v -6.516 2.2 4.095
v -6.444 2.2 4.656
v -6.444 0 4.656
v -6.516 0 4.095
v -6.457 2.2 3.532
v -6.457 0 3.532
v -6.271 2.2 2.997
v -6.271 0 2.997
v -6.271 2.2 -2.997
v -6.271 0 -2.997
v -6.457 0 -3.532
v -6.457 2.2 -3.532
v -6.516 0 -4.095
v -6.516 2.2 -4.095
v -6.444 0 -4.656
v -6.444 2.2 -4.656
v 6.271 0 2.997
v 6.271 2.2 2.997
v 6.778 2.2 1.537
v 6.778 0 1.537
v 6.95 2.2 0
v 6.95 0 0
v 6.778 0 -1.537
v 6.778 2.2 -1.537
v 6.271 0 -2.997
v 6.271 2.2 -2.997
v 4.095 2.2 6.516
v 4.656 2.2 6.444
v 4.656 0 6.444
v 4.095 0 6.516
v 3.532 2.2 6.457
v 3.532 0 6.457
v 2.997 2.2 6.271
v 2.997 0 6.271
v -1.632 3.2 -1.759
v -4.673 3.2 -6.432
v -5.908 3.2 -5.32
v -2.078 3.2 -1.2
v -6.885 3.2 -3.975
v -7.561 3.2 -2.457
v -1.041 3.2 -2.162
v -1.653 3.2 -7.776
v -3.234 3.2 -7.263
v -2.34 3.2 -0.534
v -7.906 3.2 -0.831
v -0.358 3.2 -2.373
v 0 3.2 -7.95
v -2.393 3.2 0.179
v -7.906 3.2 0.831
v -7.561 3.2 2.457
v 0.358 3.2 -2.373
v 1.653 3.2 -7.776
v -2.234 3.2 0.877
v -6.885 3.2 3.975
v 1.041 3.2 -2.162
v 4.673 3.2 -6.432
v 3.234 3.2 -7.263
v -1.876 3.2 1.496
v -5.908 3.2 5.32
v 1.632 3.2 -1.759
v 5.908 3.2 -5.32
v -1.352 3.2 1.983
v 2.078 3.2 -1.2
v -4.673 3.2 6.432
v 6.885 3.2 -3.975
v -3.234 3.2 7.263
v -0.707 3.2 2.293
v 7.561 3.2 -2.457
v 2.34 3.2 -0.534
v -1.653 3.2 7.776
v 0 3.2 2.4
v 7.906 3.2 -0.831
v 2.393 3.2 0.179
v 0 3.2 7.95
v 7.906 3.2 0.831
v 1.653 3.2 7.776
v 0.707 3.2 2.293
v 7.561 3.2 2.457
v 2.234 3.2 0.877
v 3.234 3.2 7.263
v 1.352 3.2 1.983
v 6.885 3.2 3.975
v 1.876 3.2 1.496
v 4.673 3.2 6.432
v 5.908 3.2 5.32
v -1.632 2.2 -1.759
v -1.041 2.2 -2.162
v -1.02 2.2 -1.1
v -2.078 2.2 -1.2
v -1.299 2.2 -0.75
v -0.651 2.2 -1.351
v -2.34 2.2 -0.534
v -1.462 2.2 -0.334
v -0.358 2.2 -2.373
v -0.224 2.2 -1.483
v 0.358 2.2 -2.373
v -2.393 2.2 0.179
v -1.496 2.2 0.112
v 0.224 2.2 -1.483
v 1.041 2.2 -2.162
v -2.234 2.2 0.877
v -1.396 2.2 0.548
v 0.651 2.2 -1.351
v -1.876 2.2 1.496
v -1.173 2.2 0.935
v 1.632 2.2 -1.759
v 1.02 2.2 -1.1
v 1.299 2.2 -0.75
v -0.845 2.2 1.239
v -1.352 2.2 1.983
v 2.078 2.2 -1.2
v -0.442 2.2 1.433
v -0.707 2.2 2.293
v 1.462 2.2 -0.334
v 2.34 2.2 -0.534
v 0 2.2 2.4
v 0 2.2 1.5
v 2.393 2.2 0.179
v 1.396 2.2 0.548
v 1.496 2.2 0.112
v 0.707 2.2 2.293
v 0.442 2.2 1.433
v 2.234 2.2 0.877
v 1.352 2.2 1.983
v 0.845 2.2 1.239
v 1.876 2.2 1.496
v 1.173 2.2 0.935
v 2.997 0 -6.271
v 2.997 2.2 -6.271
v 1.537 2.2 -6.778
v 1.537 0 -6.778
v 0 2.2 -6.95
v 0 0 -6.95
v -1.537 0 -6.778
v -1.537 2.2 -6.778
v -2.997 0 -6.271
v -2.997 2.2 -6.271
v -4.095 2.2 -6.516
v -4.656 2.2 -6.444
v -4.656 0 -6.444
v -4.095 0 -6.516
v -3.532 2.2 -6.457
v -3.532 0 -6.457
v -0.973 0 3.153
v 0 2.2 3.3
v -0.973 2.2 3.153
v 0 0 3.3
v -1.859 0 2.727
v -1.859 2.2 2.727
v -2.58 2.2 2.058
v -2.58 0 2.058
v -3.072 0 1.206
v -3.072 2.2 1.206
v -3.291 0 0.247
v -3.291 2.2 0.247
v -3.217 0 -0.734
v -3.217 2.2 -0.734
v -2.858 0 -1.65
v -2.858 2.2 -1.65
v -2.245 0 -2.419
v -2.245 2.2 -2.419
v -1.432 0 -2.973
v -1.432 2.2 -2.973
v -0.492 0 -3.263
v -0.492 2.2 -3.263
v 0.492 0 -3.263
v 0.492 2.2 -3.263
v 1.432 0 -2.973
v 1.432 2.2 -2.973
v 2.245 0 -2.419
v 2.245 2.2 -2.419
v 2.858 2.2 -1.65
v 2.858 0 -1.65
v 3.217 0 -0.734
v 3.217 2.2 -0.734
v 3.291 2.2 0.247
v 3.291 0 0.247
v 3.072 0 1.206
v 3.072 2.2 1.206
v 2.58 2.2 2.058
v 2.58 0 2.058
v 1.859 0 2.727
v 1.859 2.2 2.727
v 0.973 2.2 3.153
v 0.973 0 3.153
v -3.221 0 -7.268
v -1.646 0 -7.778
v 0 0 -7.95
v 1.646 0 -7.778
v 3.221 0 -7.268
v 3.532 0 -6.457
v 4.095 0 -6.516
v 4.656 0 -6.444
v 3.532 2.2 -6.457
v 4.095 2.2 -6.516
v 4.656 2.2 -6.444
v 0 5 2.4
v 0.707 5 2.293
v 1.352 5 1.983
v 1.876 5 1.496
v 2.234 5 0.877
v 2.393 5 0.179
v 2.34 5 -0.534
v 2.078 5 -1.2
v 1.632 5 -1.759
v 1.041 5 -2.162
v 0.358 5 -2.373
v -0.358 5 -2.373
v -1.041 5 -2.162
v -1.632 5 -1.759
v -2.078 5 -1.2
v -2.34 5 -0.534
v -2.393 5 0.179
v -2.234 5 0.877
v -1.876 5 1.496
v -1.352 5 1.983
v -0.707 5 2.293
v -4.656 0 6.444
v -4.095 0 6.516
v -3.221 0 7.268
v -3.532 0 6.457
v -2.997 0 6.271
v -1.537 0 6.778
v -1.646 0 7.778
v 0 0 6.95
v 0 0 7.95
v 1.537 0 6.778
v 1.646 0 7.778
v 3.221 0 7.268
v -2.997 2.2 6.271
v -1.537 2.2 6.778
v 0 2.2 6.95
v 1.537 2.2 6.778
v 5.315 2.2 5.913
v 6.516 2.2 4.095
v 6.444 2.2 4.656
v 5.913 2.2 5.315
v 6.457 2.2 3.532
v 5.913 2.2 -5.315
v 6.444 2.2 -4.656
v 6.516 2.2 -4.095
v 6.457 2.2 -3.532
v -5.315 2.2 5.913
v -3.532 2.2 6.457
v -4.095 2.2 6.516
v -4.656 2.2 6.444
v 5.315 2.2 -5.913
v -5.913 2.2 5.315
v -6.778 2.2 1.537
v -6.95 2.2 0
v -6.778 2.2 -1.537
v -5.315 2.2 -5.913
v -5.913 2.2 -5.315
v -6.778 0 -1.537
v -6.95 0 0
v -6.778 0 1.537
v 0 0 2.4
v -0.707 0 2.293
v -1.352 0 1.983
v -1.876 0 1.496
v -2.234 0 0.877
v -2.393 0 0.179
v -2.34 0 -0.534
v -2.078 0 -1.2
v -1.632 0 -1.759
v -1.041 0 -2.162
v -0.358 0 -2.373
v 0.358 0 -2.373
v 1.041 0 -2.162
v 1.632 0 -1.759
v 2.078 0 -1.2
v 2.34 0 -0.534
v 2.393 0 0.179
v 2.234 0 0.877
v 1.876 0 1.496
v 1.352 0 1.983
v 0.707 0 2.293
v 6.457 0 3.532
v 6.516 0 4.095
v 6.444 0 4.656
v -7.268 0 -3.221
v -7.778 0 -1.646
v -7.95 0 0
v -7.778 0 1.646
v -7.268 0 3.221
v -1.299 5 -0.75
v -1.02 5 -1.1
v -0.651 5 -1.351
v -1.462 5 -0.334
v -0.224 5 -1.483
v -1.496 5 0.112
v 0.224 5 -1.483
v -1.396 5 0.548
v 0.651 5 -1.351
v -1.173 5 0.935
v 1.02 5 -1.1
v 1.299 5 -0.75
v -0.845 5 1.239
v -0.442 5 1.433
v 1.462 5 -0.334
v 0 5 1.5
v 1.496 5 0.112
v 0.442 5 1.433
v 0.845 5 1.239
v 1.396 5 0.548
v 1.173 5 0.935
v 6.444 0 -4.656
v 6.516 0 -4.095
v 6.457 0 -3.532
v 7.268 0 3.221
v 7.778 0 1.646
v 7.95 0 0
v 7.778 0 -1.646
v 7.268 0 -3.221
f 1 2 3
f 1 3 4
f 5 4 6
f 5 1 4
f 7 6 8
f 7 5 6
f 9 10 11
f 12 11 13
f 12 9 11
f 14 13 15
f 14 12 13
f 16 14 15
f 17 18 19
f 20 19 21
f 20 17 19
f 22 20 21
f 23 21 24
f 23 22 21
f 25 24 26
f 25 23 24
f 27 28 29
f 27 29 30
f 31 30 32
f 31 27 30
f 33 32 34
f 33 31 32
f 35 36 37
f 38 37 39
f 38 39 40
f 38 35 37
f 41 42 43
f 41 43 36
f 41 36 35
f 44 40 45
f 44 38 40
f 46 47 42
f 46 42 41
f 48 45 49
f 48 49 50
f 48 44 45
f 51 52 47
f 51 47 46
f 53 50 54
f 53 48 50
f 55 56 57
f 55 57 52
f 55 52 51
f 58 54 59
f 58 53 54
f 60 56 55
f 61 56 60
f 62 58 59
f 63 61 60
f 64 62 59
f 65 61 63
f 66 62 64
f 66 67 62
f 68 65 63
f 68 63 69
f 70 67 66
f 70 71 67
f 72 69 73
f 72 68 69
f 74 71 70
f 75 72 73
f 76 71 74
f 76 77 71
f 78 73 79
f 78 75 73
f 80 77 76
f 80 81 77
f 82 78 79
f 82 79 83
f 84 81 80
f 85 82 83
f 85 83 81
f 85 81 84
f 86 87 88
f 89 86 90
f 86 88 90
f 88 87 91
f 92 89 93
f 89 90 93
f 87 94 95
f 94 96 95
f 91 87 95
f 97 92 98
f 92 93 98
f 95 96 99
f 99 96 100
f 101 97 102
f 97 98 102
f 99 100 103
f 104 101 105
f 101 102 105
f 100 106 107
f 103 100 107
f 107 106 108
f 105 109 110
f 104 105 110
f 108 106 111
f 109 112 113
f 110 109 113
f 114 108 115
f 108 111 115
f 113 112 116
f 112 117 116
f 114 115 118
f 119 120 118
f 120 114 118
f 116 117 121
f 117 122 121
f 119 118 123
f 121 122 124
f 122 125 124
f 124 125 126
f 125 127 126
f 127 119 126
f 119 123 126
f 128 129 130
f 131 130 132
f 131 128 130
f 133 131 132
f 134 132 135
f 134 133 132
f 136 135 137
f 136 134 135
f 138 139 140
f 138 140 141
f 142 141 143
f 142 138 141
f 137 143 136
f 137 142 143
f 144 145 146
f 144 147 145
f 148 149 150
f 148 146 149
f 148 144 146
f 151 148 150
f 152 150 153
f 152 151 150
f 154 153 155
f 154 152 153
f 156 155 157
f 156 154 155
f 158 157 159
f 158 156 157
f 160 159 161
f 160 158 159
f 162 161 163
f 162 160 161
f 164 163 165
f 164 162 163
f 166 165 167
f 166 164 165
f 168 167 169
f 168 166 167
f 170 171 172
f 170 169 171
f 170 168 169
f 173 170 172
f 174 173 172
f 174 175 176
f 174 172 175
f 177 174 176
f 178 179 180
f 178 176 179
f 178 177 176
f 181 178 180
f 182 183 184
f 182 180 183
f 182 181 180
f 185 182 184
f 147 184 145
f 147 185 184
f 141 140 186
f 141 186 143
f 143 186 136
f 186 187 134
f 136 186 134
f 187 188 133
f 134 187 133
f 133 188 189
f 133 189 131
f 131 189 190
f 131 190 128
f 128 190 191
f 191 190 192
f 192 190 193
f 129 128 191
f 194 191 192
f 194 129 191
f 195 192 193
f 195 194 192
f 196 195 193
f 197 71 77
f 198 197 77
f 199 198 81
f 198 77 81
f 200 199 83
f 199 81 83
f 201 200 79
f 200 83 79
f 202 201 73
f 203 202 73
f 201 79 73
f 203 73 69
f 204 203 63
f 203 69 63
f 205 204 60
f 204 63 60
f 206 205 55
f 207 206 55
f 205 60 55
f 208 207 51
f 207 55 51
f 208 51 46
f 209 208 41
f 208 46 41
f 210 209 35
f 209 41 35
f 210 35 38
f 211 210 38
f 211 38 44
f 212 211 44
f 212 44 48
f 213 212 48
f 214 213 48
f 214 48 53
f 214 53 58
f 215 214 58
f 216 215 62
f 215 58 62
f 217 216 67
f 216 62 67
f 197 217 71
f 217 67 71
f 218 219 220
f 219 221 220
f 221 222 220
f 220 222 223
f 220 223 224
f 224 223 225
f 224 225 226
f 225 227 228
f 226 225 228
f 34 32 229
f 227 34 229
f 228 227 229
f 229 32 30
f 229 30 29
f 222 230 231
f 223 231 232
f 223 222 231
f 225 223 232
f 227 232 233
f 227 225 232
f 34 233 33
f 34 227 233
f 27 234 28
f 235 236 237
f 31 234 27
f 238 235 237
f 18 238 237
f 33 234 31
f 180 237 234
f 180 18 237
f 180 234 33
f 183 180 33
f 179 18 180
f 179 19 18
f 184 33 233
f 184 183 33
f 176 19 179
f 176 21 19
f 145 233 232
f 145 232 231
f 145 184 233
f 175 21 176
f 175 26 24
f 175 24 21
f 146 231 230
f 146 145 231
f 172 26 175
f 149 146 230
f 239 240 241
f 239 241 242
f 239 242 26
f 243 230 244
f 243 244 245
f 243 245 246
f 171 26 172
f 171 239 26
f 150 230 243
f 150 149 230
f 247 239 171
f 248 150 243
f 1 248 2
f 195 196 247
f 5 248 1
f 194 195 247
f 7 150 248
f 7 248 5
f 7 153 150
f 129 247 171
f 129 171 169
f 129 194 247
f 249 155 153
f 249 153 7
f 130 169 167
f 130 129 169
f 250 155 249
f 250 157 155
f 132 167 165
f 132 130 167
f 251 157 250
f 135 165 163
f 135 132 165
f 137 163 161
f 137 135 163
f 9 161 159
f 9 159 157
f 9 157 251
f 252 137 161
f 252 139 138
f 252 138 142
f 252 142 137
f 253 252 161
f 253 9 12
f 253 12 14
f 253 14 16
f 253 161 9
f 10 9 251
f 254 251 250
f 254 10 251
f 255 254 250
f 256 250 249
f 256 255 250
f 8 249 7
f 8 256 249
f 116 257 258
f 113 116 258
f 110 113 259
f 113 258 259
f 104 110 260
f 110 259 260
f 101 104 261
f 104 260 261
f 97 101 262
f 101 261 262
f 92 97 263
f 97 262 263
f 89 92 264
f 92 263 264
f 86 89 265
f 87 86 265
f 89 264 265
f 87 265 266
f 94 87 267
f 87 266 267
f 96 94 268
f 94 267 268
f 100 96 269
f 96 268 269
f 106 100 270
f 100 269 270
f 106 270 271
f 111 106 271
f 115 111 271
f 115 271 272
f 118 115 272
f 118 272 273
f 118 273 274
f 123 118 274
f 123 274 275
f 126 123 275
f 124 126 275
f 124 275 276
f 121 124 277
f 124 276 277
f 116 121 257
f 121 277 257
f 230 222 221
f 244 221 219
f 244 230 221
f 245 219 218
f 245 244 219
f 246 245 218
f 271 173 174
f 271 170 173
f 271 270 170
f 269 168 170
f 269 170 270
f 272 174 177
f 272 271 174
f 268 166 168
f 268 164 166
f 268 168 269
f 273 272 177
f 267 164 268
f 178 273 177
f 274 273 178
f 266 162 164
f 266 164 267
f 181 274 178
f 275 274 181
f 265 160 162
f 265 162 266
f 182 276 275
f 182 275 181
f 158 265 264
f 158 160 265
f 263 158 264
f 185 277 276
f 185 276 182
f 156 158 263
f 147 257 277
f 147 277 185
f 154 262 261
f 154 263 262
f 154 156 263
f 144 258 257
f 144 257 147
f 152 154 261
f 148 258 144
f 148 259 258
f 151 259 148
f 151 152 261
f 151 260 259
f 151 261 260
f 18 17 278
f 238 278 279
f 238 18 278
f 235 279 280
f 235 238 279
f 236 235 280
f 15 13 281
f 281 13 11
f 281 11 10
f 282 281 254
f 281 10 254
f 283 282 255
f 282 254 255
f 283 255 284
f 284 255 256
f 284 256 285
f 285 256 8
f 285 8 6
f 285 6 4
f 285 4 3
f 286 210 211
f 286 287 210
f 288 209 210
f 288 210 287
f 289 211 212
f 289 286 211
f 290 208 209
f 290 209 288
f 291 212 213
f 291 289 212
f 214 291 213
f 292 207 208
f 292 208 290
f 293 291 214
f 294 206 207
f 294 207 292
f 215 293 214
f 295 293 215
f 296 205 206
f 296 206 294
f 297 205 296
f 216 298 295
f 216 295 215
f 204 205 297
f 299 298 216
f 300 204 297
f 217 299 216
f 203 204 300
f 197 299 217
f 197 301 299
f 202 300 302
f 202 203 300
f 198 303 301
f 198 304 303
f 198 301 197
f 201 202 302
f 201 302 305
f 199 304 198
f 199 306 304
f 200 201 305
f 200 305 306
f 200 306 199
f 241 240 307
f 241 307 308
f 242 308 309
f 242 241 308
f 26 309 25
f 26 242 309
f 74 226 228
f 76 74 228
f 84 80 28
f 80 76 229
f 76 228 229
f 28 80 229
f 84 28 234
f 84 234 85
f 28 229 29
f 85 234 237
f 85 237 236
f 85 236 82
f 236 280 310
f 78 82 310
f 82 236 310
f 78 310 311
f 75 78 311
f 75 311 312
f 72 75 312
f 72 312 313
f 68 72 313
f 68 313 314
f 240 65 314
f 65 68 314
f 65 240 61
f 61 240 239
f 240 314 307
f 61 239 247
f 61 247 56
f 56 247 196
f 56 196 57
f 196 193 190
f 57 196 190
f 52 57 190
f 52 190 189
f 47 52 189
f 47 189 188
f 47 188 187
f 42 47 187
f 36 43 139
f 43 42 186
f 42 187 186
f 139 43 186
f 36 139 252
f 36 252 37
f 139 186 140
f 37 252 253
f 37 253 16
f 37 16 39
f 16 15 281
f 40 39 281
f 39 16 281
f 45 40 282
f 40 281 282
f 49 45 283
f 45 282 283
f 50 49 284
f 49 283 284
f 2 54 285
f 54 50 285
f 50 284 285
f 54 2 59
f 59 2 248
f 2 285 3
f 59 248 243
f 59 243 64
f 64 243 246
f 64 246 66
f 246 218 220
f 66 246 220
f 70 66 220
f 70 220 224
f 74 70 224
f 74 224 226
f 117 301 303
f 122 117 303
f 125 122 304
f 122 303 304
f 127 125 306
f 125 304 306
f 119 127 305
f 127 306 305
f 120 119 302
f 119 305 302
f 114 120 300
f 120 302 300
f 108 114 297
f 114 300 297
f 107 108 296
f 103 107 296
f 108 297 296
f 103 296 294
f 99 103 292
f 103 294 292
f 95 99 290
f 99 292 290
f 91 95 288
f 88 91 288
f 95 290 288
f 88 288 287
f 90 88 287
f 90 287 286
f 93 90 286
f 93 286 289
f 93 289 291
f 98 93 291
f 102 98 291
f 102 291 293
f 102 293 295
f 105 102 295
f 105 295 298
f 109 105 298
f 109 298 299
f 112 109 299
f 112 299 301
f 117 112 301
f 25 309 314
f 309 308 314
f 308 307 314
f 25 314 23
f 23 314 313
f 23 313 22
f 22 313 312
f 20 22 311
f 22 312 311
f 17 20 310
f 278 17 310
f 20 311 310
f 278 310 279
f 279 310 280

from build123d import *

# Parameters (mm, degrees)
SKETCH1_R           = 7.95
BOSS_EXTRUDE1_DEPTH = 3.2
SKETCH2_R           = 2.4
BOSS_EXTRUDE2_DEPTH = 1.8
SHELL1_T            = -1
BOSS_EXTRUDE3_START = 2.2
SKETCH3_R           = 3.3
SKETCH3_R_2         = 2.4
BOSS_EXTRUDE3_DEPTH = 2.2
SKETCH4_R           = 2.45
CUT_EXTRUDE1_DEPTH  = 12.586414458
CIRPATTERN2_COUNT   = 4
SKETCH5_R           = 1.5
CUT_EXTRUDE2_DEPTH  = 13.304673909


with BuildPart() as part:
    # Sketch1 → Boss-Extrude1 (new body)
    with BuildSketch(Plane(origin=(0, 0, 0), x_dir=(1, 0, 0), z_dir=(0, 1, 0))):
        with Locations(Location((0, 0, 0), (0, 0, 270))):
            Circle(SKETCH1_R)
    extrude(amount=BOSS_EXTRUDE1_DEPTH)

    # Sketch2 → Boss-Extrude2 (add)
    with BuildSketch(Plane(origin=(0, 3.2, 0), x_dir=(1, 0, 0), z_dir=(0, 1, 0))):
        with Locations(Location((0, 0, 0), (0, 0, 270))):
            Circle(SKETCH2_R)
    extrude(amount=BOSS_EXTRUDE2_DEPTH)

    # Shell1
    shell1_openings = [part.faces().sort_by_distance(p)[0] for p in [
        (0, 0, 0),
    ]]
    offset(amount=SHELL1_T, openings=shell1_openings, kind=Kind.INTERSECTION)

    # Sketch3 → Boss-Extrude3 (add)
    with BuildSketch(Plane.XZ.offset(-2.2).offset(BOSS_EXTRUDE3_START)):
        with Locations(Location((0, 0, 0), (0, 0, 90))):
            Circle(SKETCH3_R)
        with Locations(Location((0, 0, 0), (0, 0, 90))):
            Circle(SKETCH3_R_2, mode=Mode.SUBTRACT)
    extrude(amount=-BOSS_EXTRUDE3_DEPTH)

    # Sketch4 → Cut-Extrude1 (cut, through all)
    with BuildSketch(Plane.XZ.offset(-2.2)):
        with Locations((-4.065863992, -4.065863992)):
            Circle(SKETCH4_R)
    cut_extrude1 = extrude(amount=CUT_EXTRUDE1_DEPTH, mode=Mode.SUBTRACT)

    # CirPattern2: Cut-Extrude1 ×4 about axis
    cirpattern2_axis = Axis((0, 0, 0), (0, 1, 0))
    for i in range(1, CIRPATTERN2_COUNT):
        add(cut_extrude1.rotate(cirpattern2_axis, i * 360 / CIRPATTERN2_COUNT), mode=Mode.SUBTRACT)

    # Sketch5 → Cut-Extrude2 (cut, through all)
    with BuildSketch(Plane(origin=(0, 5, 0), x_dir=(1, 0, 0), z_dir=(0, 1, 0))):
        with Locations(Location((0, 0, 0), (0, 0, 270))):
            Circle(SKETCH5_R)
    extrude(amount=-CUT_EXTRUDE2_DEPTH, mode=Mode.SUBTRACT)


solid = part.part
